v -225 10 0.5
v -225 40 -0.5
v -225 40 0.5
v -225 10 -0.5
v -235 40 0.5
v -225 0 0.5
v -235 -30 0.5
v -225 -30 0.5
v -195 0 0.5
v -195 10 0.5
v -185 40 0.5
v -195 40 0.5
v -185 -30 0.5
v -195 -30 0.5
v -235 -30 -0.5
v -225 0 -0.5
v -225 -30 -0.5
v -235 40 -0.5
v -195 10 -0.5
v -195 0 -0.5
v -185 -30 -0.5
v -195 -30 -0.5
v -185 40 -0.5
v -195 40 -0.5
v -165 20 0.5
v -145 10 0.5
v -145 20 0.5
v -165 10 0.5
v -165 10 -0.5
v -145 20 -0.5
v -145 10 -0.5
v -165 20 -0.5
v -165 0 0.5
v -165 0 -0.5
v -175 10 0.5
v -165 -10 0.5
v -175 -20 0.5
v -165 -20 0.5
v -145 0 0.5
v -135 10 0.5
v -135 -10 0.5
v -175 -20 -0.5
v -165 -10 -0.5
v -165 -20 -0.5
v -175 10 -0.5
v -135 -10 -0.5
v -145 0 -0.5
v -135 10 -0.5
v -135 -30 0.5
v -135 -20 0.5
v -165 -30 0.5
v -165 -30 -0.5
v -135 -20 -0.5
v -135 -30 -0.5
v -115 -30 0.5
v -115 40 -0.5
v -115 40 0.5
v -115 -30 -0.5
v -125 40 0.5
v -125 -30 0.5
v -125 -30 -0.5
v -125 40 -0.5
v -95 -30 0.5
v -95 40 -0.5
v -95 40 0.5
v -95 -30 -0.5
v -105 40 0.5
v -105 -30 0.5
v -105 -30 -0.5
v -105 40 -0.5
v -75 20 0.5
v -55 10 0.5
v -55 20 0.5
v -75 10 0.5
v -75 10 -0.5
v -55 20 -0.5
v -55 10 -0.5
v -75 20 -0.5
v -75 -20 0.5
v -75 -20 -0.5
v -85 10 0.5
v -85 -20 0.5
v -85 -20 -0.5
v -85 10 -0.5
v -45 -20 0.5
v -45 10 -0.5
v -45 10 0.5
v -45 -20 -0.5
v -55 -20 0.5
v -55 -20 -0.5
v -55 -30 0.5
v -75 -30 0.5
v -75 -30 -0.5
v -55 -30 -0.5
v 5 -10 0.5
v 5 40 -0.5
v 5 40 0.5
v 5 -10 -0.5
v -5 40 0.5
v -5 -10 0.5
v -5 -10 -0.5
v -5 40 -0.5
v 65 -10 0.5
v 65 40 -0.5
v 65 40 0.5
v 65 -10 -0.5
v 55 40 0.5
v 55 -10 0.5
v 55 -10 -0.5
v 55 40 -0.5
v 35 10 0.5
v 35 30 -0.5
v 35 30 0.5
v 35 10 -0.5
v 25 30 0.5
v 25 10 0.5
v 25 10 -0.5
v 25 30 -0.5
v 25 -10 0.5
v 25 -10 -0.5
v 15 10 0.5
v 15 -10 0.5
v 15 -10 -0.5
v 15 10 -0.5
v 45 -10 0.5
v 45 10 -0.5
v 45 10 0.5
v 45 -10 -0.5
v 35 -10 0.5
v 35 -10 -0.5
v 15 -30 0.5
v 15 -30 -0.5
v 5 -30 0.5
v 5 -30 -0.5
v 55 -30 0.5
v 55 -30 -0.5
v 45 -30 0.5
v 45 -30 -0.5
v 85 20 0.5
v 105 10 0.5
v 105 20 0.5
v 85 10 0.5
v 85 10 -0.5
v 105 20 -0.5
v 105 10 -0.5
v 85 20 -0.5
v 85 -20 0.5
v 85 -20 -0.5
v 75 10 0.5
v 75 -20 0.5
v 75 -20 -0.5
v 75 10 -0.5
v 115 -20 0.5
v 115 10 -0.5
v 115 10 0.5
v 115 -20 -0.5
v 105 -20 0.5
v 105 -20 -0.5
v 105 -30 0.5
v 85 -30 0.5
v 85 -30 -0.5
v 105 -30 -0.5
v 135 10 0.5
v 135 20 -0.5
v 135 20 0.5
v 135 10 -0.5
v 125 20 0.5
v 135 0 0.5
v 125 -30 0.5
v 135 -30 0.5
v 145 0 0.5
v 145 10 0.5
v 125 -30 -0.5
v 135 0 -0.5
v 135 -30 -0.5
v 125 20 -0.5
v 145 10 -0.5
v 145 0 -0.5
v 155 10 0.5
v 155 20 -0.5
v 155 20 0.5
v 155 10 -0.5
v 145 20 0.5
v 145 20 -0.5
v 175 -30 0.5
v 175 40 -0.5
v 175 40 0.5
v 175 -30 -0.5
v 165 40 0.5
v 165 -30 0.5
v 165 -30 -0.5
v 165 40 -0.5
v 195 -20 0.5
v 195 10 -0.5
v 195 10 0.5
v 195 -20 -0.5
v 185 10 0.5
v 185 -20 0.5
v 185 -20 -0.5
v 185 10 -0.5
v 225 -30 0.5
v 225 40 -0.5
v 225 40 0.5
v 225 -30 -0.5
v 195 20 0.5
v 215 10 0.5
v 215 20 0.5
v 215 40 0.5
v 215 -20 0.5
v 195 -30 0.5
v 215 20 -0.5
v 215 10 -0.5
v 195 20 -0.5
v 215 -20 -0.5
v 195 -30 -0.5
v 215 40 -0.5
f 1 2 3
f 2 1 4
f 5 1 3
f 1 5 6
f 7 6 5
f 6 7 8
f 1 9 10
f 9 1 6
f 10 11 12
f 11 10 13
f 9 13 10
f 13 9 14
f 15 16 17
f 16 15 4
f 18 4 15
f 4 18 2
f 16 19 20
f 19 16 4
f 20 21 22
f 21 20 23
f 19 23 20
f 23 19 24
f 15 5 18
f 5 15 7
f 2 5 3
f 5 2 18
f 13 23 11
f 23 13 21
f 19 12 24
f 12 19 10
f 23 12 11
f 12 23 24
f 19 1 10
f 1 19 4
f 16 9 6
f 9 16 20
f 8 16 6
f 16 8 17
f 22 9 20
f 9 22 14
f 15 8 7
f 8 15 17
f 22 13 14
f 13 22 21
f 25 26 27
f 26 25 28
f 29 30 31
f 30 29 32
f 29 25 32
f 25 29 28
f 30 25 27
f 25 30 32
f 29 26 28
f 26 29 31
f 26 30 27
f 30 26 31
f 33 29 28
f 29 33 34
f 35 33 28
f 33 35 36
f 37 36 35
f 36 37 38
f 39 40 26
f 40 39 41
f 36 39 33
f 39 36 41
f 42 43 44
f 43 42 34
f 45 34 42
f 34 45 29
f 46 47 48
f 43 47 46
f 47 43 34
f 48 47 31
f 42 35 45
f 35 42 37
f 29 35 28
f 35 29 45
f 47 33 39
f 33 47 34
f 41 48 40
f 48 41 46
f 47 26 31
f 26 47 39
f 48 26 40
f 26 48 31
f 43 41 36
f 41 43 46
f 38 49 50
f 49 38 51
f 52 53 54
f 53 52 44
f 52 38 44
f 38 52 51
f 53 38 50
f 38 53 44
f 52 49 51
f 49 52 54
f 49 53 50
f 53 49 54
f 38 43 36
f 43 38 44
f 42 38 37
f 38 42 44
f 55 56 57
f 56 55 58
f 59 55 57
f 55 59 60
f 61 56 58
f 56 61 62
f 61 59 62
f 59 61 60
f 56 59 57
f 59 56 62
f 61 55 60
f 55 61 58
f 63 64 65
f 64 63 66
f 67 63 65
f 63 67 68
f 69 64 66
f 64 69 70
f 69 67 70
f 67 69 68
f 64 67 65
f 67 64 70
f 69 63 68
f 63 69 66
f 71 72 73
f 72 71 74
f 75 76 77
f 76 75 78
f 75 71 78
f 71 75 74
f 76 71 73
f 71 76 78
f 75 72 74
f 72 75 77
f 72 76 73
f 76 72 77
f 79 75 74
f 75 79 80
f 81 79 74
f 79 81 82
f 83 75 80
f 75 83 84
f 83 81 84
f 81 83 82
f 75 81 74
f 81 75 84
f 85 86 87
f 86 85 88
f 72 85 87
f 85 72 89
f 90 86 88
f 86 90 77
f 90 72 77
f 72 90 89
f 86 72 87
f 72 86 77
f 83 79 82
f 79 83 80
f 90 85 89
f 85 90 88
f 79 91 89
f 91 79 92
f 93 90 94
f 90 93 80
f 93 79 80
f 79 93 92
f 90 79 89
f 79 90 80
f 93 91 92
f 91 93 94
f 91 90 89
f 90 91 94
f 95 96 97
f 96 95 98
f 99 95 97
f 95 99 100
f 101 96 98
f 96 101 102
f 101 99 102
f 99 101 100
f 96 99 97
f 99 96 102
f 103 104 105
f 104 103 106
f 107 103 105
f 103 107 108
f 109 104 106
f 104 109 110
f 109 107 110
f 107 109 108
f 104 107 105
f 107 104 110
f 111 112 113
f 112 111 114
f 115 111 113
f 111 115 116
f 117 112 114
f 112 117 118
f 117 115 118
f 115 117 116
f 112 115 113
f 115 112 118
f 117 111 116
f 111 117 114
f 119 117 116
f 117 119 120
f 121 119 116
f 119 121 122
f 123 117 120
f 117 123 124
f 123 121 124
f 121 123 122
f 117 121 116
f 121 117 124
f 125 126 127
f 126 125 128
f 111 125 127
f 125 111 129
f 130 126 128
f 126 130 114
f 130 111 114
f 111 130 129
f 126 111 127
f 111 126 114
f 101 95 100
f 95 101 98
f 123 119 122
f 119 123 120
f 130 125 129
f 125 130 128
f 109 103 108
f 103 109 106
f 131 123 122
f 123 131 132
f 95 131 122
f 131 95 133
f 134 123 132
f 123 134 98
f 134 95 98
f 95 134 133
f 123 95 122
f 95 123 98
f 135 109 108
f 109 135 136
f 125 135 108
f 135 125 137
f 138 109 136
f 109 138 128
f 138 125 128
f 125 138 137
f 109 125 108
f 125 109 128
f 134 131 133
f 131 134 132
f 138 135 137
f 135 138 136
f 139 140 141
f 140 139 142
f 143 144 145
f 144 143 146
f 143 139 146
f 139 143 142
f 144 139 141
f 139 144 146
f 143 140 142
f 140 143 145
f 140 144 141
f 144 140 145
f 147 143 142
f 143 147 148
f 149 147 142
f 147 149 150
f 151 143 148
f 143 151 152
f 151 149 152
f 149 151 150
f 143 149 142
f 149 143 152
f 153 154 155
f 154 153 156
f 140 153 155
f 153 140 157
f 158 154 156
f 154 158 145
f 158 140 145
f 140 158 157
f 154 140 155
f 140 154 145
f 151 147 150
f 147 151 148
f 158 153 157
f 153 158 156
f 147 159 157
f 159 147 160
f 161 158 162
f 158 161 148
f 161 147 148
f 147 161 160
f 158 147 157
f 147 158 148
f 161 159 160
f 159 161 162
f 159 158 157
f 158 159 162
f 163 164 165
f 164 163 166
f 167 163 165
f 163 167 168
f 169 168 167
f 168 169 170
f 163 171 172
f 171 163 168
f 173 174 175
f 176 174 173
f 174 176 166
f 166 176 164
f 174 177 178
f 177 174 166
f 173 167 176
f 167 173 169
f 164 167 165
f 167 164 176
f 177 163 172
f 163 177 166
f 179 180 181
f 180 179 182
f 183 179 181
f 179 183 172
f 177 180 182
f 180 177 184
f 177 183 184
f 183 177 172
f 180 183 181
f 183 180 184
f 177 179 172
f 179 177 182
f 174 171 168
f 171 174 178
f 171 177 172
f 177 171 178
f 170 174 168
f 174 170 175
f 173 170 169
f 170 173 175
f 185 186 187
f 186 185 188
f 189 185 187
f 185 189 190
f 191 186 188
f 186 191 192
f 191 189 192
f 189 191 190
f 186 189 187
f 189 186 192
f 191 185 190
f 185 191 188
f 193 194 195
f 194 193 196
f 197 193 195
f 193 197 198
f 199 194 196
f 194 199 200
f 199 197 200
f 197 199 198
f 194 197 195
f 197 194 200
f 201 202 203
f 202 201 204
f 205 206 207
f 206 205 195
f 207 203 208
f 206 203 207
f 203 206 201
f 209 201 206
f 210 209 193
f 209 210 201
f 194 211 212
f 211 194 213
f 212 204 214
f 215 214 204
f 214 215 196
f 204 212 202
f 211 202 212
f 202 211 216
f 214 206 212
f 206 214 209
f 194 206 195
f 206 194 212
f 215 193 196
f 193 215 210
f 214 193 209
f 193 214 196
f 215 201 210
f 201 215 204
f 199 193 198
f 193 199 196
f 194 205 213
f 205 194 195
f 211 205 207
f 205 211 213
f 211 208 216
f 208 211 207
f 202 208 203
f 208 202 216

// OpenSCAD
// file: ../writer.scad
/*
_ascii = " !\"#$%&'()*+,-./0123456789:;<=>?@ABCDEFGHIJKLMNOPQRSTUVWXYZ[\\]^_`abcdefghijklmnopqrstuvwxyz{|}~";
_ansi = "€ ‚ƒ„…†‡ˆ‰Š‹Œ Ž  ‘’“”•–—˜™š›œ žŸ ¡¢£¤¥¦§¨©«¬ ®¯°±²³´µ¶·¸¹º»¼½¾¿ÀÁÂÃÄÅÆÇÈÉÊËÌÍÎÏÐÑÒÓÔÕÖ×ØÙÚÛÜÝÞßàáâãäåæçèéêëìíîïðñòóôõö÷øùúûüýþÿ";

*/
// to do: define fallback character


module write(text,font,size=[10,10,1] , center=false , pixel_signifier = "1" , fallback_char = "?" ) {
	matrix = charmatrix( text[0] , font , fallback_char );
	font_height = len(matrix); 
	
	move = center ? [-textwidth( text, font, fallback_char = fallback_char ) * size[0]/2 , -font_height*size[1]/2 , -size[2]/2 ] : [0,0,0];
	translate(move)
		for ( i = [0:len(text)-1] ) {
			translate([charpos( text , i , font , fallback_char = fallback_char )*size[0],0,0])
				draw_char(text[i],font,size,pixel_signifier,fallback_char)
					if ( $children > 0 ) {
						children();
					} else {
						cube(size);
					}
		}
}

module draw_char( char , font , size=[10,10] , pixel_signifier = "1" , fallback_char = "?" ) {
	matrix = charmatrix(char , font , fallback_char );
	font_height = len(matrix); 
	union() {
		for ( y = [0:len(matrix)-1] ) 
			for ( x = [0:charwidth( char , font , fallback_char )-1] ) {
			
				if ( matrix[y][x] == pixel_signifier )
					translate([x*size[0],(font_height-y-1)*size[1],0])
						children();
			}
	}
}


function charstruct( char , font , fallback_char = "?" ) 
	= ( (font[ search( [char] , font )[0] ] == undef) ? charstruct(fallback_char,font) : font[ search( [char] , font )[0] ] );
	
function charmatrix( char , font , fallback_char = "?" ) 
	= charstruct( char , font , fallback_char )[1];
	
function charwidth( char , font , fallback_char = "?" ) 
	= len(charmatrix( char , font , fallback_char )[0]);
	
function charpos( text , index , font , pos=0 , fallback_char = "?" ) 
	= ( index==0 ? pos : charpos( text , index-1 , font , pos + charwidth( text[index-1] , font , fallback_char ) , fallback_char ) );

// return pixel width of text
function textwidth( text , font , width = 0 , index = 0 , fallback_char = "?" ) 
	= ( index==len(text) ? width : textwidth( text , font , width + charwidth( text[index] , font , fallback_char ) , index+1) );
// main file
use <../writer.scad>;
include <../fonts/default_font.scad>;

write("Hello World",default_font,center=true);
